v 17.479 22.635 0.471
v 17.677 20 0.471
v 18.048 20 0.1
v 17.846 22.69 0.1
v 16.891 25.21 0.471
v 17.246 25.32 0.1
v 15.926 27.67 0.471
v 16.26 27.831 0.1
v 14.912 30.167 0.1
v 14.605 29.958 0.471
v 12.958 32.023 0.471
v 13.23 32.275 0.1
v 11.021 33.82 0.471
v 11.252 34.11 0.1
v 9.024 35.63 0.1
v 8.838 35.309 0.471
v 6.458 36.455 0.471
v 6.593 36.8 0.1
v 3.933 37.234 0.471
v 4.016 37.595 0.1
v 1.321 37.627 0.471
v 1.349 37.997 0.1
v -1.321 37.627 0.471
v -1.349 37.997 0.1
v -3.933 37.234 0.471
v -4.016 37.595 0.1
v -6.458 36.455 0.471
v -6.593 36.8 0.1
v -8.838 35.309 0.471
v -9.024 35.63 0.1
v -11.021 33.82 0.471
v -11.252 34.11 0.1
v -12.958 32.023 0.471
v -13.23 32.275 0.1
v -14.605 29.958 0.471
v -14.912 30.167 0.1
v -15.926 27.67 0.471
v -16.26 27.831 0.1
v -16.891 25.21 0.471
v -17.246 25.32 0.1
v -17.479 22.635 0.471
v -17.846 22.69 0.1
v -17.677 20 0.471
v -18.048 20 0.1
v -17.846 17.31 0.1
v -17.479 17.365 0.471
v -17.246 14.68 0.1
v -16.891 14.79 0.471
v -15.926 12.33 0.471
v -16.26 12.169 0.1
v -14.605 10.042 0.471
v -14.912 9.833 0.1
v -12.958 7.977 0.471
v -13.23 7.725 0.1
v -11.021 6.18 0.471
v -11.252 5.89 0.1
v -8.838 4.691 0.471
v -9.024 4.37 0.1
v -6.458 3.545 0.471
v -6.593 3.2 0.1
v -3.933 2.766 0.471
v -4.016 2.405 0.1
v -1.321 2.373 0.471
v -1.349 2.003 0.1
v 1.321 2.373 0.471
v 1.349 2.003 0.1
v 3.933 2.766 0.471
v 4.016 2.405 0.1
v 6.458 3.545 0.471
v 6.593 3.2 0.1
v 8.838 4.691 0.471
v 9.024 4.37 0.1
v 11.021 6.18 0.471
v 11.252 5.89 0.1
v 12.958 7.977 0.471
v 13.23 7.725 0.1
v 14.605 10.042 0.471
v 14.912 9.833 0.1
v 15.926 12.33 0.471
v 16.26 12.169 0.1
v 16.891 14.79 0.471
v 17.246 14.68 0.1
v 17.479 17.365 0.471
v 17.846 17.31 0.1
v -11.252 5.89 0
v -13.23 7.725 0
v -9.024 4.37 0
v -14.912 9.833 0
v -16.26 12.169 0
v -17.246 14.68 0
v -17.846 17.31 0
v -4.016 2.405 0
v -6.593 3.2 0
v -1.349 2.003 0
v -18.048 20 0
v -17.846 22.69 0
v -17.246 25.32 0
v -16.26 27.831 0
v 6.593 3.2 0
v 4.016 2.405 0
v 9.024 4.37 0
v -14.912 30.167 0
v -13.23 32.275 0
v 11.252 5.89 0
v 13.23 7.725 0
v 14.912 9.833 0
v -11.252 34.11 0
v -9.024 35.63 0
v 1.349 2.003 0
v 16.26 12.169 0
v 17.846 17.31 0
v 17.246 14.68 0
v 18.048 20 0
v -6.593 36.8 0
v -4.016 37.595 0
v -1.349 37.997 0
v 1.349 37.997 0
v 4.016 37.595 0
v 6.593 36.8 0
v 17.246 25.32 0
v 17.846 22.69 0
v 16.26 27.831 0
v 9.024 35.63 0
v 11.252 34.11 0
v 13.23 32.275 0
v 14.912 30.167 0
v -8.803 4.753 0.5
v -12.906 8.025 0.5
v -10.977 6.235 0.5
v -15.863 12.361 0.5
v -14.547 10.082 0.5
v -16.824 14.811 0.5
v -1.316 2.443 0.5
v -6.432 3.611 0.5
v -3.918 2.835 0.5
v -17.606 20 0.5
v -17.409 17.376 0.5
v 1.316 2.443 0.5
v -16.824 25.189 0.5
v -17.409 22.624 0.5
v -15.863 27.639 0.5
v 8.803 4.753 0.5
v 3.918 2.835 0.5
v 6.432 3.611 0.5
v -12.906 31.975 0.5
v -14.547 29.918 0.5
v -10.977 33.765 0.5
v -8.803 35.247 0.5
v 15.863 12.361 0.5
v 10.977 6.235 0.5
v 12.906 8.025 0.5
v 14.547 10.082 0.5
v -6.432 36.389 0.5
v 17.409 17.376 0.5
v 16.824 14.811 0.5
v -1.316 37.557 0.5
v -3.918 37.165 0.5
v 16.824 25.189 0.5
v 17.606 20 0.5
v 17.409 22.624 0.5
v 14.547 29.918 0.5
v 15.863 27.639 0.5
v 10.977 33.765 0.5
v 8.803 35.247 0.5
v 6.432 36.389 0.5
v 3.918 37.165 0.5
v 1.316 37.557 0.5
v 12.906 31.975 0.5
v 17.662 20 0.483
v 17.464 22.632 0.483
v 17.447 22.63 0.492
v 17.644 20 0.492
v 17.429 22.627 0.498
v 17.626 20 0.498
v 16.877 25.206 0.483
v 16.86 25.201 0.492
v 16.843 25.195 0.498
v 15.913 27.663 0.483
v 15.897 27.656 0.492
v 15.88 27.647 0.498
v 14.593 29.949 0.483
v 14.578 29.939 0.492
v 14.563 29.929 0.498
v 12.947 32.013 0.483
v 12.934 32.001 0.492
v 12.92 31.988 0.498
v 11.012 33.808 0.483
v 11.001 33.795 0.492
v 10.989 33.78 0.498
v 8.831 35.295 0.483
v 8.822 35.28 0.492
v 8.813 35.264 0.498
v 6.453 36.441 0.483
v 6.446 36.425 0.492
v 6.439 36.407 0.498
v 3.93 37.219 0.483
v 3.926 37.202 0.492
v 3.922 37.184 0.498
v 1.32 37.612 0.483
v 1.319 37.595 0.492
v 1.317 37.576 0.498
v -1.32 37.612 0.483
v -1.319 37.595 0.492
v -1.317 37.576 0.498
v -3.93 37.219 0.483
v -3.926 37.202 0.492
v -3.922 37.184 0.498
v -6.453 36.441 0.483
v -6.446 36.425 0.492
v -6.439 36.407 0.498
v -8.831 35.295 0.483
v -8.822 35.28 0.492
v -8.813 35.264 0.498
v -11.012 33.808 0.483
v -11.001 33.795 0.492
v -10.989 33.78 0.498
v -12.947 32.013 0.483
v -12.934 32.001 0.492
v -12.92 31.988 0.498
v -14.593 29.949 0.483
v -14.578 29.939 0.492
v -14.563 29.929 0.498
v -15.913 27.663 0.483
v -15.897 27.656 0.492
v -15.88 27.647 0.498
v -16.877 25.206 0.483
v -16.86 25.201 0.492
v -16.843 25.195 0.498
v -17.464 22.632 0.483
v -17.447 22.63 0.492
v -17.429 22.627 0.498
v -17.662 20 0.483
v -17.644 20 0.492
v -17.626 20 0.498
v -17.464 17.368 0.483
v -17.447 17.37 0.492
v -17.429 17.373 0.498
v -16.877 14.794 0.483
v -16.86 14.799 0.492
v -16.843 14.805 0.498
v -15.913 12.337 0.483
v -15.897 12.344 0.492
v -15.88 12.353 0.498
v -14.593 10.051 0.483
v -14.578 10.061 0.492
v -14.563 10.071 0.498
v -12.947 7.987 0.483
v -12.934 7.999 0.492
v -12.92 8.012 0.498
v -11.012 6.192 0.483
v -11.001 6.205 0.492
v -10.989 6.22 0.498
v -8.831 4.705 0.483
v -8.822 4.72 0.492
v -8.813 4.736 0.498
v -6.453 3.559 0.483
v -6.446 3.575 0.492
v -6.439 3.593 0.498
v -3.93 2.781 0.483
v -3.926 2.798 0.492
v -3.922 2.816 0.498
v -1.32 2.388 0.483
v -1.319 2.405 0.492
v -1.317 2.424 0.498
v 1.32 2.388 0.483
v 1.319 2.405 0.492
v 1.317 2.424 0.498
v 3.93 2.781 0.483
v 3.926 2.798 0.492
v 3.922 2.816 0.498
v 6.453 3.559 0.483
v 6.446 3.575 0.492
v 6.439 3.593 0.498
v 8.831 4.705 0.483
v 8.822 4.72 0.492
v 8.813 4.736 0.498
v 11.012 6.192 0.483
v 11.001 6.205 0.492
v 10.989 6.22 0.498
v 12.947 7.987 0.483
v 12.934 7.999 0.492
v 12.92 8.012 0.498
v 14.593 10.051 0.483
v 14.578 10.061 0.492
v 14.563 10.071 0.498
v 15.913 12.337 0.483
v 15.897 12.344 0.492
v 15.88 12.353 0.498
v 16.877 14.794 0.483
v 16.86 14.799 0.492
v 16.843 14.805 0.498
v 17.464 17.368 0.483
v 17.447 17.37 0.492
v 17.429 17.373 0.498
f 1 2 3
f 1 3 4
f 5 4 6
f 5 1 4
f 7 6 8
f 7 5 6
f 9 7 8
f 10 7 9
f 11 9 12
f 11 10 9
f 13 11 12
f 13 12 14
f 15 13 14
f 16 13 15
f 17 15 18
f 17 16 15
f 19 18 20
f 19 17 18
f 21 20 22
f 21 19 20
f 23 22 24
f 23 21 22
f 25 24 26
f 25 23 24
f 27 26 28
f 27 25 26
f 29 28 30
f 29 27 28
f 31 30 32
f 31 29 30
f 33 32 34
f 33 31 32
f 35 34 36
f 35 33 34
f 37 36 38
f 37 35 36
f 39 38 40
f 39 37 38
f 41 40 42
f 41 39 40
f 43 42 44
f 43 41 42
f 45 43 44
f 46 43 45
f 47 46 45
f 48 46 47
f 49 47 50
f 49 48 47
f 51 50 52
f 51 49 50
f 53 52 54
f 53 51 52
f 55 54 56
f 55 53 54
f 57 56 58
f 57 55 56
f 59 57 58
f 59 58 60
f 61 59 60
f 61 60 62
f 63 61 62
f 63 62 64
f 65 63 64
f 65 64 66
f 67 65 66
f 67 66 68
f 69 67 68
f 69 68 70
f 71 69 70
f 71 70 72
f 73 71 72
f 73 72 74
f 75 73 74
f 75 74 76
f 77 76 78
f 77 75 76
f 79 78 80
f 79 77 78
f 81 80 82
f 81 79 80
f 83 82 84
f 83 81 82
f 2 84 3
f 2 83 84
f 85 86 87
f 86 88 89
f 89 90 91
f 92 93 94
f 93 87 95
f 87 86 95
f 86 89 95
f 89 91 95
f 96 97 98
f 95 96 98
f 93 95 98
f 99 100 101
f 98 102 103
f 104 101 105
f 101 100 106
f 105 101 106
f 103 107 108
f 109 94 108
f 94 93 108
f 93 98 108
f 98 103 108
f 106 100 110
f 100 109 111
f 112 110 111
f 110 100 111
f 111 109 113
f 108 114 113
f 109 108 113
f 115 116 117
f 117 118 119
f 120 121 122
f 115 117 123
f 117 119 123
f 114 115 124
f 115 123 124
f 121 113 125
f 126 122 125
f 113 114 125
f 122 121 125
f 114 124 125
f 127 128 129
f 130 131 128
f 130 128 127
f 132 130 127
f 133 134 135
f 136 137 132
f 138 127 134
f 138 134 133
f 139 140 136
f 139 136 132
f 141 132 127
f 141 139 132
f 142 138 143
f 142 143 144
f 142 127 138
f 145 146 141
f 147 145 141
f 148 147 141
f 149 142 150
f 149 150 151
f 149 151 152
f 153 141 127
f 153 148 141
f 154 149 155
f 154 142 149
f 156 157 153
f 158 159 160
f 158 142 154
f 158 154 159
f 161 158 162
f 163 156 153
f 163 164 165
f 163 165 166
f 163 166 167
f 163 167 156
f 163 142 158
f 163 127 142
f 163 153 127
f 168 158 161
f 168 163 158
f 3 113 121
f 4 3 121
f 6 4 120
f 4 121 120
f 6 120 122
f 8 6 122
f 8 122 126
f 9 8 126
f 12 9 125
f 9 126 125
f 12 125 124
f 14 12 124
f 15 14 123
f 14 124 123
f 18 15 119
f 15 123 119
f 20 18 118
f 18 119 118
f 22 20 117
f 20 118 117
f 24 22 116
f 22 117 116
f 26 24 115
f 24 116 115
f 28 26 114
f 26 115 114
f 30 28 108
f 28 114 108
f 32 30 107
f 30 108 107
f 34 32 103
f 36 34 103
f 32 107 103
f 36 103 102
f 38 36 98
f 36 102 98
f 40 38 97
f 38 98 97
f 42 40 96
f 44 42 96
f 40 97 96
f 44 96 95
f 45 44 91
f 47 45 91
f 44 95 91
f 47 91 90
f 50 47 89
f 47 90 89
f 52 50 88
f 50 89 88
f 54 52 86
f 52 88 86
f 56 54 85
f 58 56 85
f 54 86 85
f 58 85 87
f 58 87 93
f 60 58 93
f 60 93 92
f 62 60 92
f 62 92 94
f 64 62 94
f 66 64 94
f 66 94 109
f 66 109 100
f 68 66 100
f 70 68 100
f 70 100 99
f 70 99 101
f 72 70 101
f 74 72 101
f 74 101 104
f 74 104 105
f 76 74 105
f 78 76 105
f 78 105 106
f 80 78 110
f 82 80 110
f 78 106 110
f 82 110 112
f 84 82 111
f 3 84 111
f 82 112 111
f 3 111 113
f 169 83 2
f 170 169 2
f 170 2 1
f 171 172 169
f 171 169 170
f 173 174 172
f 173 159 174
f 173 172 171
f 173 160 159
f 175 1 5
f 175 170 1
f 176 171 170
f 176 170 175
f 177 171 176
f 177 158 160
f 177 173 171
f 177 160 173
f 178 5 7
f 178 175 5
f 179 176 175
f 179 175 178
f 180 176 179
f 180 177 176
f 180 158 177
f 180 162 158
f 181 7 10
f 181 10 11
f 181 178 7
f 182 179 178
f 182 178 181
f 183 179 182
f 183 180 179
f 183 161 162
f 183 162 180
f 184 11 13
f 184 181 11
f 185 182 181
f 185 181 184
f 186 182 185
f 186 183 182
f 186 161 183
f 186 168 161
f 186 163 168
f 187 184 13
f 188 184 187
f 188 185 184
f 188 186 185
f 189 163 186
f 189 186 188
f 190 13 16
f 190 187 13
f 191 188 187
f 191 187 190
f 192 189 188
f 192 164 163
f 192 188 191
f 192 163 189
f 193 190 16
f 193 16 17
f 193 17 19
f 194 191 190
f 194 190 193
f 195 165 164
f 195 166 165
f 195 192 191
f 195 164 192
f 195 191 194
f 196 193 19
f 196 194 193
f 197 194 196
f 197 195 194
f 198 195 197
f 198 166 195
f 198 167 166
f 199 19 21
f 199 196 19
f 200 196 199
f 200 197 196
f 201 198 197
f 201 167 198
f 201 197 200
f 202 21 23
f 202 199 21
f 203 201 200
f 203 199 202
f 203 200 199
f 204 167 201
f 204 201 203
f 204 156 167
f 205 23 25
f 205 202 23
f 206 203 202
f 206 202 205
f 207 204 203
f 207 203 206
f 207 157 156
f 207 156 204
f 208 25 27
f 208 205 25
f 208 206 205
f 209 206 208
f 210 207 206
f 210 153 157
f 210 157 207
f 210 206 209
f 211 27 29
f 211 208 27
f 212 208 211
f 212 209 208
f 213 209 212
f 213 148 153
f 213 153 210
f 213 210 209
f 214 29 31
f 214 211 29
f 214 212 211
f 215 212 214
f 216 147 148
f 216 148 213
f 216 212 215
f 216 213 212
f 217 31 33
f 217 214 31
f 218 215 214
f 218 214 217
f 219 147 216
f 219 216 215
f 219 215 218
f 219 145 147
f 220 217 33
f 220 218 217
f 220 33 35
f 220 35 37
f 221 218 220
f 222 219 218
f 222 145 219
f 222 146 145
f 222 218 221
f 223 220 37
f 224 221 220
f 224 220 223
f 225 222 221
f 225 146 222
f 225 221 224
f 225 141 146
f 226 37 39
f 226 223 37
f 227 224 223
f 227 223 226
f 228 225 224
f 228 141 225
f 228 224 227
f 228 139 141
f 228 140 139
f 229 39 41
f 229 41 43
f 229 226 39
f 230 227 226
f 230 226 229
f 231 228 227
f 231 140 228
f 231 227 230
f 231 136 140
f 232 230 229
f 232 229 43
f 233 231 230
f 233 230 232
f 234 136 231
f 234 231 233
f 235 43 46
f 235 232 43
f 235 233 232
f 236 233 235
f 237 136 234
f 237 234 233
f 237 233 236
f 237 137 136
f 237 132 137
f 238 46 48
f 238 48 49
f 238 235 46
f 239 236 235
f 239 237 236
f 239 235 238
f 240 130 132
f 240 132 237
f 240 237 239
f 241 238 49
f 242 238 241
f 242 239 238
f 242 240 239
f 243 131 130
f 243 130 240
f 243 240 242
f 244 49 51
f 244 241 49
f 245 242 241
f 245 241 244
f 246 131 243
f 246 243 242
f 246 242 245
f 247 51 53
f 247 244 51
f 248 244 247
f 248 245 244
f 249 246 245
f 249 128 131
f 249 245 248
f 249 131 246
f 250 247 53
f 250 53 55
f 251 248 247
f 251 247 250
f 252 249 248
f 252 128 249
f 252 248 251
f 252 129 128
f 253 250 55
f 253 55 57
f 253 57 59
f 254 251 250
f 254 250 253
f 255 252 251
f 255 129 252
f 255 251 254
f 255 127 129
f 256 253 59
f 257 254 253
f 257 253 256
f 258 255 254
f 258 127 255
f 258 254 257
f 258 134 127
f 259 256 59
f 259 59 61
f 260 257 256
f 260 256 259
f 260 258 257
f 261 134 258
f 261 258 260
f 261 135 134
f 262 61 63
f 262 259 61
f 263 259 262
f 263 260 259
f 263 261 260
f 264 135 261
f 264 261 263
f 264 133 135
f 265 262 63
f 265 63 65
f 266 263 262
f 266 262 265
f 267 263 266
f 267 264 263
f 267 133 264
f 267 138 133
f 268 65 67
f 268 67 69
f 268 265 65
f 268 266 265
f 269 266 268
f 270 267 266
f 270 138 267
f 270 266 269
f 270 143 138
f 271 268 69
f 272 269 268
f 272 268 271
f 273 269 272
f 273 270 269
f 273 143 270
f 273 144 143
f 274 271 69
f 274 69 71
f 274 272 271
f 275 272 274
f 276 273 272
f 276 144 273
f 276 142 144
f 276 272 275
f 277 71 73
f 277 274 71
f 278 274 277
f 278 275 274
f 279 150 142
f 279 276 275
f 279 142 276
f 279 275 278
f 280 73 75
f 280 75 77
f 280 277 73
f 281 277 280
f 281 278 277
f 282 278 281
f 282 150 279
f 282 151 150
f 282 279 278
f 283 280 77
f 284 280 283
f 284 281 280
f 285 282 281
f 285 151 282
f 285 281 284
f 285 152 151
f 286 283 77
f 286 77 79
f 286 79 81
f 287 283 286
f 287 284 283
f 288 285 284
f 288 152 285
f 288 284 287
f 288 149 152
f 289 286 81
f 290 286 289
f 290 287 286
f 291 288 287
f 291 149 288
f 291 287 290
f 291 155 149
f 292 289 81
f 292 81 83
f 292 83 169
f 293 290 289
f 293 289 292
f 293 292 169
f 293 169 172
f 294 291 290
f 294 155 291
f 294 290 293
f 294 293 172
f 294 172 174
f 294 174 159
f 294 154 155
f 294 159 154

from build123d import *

# Parameters (mm, degrees)
SKETCH1_R           = 18.04750383
BOSS_EXTRUDE1_DEPTH = 0.5
CHAMFER1_SIZE       = 0.4
FILLET1_R           = 0.1


with BuildPart() as part:
    # Sketch1 → Boss-Extrude1 (new body)
    with BuildSketch(Plane.XY):
        with Locations((0, 20)):
            Circle(SKETCH1_R)
    extrude(amount=BOSS_EXTRUDE1_DEPTH)

    # Chamfer1
    chamfer1_edges = [part.edges().sort_by_distance(p)[0] for p in [
        (-18.04750383, 20, 0.5),
    ]]
    chamfer(chamfer1_edges, length=CHAMFER1_SIZE)

    # Fillet1
    fillet1_edges = [part.edges().sort_by_distance(p)[0] for p in [
        (-17.64750383, 20, 0.5),
    ]]
    fillet(fillet1_edges, radius=FILLET1_R)


solid = part.part
